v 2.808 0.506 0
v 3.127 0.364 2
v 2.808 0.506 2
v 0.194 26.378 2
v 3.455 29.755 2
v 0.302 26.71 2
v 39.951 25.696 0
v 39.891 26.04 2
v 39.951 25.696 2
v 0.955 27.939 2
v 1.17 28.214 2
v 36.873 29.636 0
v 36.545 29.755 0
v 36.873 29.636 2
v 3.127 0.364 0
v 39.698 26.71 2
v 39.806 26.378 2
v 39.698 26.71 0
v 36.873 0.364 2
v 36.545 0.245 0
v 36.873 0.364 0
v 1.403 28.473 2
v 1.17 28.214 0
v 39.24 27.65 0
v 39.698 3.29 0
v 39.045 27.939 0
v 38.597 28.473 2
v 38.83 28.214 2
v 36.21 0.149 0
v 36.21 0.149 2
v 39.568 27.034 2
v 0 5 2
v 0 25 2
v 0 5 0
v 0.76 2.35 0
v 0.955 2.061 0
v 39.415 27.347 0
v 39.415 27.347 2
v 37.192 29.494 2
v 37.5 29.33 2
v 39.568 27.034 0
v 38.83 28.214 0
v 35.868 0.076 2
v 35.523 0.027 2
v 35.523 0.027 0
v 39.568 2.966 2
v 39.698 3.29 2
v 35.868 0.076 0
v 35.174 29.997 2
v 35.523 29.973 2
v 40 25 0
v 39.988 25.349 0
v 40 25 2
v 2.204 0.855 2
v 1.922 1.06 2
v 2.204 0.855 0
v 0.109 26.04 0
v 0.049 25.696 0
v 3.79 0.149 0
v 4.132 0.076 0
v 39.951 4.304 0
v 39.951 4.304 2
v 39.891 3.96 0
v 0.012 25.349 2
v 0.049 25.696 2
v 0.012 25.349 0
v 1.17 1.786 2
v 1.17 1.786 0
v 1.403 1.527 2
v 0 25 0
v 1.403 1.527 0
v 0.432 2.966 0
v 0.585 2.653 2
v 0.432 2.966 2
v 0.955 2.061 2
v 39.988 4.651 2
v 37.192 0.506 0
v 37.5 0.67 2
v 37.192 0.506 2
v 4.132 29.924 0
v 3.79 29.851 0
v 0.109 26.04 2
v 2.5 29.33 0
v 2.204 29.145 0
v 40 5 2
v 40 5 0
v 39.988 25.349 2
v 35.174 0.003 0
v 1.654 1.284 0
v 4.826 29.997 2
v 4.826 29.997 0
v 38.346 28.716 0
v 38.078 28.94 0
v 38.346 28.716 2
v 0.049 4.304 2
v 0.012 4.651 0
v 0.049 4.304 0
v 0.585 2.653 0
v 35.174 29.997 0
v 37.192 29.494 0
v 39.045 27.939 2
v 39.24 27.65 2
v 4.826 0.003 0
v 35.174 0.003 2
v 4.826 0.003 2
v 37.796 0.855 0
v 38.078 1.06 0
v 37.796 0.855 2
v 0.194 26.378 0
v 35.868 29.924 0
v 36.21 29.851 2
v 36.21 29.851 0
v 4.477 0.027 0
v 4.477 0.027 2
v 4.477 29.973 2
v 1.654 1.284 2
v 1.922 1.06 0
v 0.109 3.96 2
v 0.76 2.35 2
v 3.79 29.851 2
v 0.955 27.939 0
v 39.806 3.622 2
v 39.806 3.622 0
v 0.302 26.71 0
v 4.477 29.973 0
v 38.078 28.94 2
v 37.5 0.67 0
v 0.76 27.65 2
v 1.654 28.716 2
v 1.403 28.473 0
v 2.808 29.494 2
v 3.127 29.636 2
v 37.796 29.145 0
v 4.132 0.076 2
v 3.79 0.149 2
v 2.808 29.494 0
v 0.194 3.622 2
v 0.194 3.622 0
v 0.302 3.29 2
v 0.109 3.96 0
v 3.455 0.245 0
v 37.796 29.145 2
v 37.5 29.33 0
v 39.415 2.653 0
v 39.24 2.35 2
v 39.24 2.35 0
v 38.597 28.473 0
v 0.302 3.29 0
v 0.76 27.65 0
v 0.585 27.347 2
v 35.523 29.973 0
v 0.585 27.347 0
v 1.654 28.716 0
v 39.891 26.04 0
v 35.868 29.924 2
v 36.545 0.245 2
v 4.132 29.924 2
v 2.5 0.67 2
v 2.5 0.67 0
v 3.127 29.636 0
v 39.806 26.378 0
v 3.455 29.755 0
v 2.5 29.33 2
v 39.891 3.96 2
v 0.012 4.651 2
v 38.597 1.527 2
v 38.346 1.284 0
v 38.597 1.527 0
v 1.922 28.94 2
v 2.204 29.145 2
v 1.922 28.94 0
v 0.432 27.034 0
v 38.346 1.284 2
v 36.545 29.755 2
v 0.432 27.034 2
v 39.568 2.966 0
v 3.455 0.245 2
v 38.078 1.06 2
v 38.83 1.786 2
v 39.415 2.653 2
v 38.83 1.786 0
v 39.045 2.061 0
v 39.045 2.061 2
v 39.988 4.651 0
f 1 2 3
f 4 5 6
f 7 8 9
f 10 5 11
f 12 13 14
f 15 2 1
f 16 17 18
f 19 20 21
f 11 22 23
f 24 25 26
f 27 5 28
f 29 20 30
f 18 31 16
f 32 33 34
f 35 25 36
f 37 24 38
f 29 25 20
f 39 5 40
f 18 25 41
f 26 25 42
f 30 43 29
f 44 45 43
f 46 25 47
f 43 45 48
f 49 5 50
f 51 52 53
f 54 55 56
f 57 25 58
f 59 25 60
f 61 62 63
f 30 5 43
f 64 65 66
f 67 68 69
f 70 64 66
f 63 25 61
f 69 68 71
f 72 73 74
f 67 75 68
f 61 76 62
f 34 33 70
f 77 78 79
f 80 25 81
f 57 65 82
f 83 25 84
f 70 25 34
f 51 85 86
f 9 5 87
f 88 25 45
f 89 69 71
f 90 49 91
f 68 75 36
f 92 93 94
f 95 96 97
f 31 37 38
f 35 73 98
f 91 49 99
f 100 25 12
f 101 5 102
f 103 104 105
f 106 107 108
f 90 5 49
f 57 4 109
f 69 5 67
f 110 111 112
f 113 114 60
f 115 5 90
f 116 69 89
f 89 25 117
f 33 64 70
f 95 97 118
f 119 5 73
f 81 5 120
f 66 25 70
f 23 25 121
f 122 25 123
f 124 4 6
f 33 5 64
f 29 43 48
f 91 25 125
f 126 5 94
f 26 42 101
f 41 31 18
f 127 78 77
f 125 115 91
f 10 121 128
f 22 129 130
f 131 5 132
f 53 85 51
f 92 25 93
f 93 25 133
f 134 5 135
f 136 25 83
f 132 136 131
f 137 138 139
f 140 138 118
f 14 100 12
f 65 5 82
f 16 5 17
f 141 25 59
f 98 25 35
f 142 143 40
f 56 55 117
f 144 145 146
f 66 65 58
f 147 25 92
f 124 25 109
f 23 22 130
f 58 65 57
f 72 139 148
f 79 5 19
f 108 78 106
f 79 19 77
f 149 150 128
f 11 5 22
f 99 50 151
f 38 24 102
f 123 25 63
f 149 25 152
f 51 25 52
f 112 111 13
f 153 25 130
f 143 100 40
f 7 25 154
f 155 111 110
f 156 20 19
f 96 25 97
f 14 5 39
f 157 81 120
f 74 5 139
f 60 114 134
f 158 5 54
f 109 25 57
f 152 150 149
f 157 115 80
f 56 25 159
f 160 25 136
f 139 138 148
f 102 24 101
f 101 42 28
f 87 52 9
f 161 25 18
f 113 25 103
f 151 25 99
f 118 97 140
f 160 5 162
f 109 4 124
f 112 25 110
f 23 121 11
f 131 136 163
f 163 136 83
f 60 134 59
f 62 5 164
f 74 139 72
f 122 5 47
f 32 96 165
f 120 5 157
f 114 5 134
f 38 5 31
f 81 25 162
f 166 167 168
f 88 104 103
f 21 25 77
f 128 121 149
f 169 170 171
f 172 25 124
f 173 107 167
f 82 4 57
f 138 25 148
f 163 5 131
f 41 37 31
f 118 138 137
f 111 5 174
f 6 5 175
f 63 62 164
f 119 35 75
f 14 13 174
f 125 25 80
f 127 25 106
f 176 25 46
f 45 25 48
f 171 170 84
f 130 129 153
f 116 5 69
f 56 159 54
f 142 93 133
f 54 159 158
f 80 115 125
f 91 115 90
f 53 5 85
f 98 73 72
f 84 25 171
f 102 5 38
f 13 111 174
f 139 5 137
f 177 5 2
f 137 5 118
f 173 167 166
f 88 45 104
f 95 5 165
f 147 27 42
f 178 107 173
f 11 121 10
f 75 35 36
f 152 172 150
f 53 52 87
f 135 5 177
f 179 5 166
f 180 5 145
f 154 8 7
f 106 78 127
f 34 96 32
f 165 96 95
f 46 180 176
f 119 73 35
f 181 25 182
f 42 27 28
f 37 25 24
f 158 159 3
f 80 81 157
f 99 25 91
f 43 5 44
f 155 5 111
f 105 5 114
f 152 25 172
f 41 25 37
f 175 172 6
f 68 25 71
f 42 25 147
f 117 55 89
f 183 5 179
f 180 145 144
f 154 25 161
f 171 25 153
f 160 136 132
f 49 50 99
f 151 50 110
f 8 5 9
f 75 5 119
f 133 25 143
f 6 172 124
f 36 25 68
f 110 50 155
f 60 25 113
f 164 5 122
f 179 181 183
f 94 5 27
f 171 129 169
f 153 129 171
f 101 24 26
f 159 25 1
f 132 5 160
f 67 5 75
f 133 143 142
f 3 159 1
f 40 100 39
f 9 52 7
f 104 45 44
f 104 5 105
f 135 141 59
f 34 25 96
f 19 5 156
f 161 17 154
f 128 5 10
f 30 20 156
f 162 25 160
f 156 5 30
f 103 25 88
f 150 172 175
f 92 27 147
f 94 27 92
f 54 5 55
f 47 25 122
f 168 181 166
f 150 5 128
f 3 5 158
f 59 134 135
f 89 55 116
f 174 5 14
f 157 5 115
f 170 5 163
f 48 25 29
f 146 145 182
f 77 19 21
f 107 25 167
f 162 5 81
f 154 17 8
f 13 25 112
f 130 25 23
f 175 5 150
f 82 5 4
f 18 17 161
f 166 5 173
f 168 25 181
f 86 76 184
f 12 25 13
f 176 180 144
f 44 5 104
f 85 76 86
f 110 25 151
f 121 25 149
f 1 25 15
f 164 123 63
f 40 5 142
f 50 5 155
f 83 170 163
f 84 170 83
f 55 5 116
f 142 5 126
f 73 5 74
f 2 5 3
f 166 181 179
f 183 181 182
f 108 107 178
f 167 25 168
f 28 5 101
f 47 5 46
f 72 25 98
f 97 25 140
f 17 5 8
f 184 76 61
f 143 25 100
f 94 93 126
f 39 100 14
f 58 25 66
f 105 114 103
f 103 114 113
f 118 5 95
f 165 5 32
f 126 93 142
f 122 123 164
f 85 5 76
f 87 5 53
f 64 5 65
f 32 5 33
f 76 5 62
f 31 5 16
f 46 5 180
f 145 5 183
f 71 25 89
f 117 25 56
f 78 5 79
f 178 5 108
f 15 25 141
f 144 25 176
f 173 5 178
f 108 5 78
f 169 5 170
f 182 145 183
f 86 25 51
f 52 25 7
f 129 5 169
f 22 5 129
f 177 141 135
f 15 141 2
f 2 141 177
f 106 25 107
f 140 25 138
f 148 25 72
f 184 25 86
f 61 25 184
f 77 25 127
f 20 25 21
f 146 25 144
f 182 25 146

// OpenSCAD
module round_cube (x=40,y=30,z=2,d=10)
{
    A = x-d;
    B = y-d;
    C = z;
    
    translate([d/2,d/2,0])
    hull()
    {
        cylinder(d=d, h=C);
        translate([A,0,0]) cylinder(d=d, h=C);
        translate([A,B,0]) cylinder(d=d, h=C);
        translate([0,B,0]) cylinder(d=d, h=C);
    }
    
    
}

round_cube();

$fn = 90;
module box (x=82,y=154,z=52,d=20,t=2)
{
    A = x-d;
    B = y-d;
    C = z;
    
    //%translate([-d/2,-d/2,0]) cube([x,y,z]);
    difference()
    {
        hull()
        {
            cylinder(d=d, h=C);
            translate([A,0,0]) cylinder(d=d, h=C);
            translate([A,B,0]) cylinder(d=d, h=C);
            translate([0,B,0]) cylinder(d=d, h=C);
        }
        
        translate([-t/2,-t/2,t])
        hull()
        {
            translate([t,t,0]) cylinder(d=d-t, h=C);
            translate([A,t,0]) cylinder(d=d-t, h=C);
            translate([A,B,0]) cylinder(d=d-t, h=C);
            translate([t,B,0]) cylinder(d=d-t, h=C);
        }
    }
}

//box();
